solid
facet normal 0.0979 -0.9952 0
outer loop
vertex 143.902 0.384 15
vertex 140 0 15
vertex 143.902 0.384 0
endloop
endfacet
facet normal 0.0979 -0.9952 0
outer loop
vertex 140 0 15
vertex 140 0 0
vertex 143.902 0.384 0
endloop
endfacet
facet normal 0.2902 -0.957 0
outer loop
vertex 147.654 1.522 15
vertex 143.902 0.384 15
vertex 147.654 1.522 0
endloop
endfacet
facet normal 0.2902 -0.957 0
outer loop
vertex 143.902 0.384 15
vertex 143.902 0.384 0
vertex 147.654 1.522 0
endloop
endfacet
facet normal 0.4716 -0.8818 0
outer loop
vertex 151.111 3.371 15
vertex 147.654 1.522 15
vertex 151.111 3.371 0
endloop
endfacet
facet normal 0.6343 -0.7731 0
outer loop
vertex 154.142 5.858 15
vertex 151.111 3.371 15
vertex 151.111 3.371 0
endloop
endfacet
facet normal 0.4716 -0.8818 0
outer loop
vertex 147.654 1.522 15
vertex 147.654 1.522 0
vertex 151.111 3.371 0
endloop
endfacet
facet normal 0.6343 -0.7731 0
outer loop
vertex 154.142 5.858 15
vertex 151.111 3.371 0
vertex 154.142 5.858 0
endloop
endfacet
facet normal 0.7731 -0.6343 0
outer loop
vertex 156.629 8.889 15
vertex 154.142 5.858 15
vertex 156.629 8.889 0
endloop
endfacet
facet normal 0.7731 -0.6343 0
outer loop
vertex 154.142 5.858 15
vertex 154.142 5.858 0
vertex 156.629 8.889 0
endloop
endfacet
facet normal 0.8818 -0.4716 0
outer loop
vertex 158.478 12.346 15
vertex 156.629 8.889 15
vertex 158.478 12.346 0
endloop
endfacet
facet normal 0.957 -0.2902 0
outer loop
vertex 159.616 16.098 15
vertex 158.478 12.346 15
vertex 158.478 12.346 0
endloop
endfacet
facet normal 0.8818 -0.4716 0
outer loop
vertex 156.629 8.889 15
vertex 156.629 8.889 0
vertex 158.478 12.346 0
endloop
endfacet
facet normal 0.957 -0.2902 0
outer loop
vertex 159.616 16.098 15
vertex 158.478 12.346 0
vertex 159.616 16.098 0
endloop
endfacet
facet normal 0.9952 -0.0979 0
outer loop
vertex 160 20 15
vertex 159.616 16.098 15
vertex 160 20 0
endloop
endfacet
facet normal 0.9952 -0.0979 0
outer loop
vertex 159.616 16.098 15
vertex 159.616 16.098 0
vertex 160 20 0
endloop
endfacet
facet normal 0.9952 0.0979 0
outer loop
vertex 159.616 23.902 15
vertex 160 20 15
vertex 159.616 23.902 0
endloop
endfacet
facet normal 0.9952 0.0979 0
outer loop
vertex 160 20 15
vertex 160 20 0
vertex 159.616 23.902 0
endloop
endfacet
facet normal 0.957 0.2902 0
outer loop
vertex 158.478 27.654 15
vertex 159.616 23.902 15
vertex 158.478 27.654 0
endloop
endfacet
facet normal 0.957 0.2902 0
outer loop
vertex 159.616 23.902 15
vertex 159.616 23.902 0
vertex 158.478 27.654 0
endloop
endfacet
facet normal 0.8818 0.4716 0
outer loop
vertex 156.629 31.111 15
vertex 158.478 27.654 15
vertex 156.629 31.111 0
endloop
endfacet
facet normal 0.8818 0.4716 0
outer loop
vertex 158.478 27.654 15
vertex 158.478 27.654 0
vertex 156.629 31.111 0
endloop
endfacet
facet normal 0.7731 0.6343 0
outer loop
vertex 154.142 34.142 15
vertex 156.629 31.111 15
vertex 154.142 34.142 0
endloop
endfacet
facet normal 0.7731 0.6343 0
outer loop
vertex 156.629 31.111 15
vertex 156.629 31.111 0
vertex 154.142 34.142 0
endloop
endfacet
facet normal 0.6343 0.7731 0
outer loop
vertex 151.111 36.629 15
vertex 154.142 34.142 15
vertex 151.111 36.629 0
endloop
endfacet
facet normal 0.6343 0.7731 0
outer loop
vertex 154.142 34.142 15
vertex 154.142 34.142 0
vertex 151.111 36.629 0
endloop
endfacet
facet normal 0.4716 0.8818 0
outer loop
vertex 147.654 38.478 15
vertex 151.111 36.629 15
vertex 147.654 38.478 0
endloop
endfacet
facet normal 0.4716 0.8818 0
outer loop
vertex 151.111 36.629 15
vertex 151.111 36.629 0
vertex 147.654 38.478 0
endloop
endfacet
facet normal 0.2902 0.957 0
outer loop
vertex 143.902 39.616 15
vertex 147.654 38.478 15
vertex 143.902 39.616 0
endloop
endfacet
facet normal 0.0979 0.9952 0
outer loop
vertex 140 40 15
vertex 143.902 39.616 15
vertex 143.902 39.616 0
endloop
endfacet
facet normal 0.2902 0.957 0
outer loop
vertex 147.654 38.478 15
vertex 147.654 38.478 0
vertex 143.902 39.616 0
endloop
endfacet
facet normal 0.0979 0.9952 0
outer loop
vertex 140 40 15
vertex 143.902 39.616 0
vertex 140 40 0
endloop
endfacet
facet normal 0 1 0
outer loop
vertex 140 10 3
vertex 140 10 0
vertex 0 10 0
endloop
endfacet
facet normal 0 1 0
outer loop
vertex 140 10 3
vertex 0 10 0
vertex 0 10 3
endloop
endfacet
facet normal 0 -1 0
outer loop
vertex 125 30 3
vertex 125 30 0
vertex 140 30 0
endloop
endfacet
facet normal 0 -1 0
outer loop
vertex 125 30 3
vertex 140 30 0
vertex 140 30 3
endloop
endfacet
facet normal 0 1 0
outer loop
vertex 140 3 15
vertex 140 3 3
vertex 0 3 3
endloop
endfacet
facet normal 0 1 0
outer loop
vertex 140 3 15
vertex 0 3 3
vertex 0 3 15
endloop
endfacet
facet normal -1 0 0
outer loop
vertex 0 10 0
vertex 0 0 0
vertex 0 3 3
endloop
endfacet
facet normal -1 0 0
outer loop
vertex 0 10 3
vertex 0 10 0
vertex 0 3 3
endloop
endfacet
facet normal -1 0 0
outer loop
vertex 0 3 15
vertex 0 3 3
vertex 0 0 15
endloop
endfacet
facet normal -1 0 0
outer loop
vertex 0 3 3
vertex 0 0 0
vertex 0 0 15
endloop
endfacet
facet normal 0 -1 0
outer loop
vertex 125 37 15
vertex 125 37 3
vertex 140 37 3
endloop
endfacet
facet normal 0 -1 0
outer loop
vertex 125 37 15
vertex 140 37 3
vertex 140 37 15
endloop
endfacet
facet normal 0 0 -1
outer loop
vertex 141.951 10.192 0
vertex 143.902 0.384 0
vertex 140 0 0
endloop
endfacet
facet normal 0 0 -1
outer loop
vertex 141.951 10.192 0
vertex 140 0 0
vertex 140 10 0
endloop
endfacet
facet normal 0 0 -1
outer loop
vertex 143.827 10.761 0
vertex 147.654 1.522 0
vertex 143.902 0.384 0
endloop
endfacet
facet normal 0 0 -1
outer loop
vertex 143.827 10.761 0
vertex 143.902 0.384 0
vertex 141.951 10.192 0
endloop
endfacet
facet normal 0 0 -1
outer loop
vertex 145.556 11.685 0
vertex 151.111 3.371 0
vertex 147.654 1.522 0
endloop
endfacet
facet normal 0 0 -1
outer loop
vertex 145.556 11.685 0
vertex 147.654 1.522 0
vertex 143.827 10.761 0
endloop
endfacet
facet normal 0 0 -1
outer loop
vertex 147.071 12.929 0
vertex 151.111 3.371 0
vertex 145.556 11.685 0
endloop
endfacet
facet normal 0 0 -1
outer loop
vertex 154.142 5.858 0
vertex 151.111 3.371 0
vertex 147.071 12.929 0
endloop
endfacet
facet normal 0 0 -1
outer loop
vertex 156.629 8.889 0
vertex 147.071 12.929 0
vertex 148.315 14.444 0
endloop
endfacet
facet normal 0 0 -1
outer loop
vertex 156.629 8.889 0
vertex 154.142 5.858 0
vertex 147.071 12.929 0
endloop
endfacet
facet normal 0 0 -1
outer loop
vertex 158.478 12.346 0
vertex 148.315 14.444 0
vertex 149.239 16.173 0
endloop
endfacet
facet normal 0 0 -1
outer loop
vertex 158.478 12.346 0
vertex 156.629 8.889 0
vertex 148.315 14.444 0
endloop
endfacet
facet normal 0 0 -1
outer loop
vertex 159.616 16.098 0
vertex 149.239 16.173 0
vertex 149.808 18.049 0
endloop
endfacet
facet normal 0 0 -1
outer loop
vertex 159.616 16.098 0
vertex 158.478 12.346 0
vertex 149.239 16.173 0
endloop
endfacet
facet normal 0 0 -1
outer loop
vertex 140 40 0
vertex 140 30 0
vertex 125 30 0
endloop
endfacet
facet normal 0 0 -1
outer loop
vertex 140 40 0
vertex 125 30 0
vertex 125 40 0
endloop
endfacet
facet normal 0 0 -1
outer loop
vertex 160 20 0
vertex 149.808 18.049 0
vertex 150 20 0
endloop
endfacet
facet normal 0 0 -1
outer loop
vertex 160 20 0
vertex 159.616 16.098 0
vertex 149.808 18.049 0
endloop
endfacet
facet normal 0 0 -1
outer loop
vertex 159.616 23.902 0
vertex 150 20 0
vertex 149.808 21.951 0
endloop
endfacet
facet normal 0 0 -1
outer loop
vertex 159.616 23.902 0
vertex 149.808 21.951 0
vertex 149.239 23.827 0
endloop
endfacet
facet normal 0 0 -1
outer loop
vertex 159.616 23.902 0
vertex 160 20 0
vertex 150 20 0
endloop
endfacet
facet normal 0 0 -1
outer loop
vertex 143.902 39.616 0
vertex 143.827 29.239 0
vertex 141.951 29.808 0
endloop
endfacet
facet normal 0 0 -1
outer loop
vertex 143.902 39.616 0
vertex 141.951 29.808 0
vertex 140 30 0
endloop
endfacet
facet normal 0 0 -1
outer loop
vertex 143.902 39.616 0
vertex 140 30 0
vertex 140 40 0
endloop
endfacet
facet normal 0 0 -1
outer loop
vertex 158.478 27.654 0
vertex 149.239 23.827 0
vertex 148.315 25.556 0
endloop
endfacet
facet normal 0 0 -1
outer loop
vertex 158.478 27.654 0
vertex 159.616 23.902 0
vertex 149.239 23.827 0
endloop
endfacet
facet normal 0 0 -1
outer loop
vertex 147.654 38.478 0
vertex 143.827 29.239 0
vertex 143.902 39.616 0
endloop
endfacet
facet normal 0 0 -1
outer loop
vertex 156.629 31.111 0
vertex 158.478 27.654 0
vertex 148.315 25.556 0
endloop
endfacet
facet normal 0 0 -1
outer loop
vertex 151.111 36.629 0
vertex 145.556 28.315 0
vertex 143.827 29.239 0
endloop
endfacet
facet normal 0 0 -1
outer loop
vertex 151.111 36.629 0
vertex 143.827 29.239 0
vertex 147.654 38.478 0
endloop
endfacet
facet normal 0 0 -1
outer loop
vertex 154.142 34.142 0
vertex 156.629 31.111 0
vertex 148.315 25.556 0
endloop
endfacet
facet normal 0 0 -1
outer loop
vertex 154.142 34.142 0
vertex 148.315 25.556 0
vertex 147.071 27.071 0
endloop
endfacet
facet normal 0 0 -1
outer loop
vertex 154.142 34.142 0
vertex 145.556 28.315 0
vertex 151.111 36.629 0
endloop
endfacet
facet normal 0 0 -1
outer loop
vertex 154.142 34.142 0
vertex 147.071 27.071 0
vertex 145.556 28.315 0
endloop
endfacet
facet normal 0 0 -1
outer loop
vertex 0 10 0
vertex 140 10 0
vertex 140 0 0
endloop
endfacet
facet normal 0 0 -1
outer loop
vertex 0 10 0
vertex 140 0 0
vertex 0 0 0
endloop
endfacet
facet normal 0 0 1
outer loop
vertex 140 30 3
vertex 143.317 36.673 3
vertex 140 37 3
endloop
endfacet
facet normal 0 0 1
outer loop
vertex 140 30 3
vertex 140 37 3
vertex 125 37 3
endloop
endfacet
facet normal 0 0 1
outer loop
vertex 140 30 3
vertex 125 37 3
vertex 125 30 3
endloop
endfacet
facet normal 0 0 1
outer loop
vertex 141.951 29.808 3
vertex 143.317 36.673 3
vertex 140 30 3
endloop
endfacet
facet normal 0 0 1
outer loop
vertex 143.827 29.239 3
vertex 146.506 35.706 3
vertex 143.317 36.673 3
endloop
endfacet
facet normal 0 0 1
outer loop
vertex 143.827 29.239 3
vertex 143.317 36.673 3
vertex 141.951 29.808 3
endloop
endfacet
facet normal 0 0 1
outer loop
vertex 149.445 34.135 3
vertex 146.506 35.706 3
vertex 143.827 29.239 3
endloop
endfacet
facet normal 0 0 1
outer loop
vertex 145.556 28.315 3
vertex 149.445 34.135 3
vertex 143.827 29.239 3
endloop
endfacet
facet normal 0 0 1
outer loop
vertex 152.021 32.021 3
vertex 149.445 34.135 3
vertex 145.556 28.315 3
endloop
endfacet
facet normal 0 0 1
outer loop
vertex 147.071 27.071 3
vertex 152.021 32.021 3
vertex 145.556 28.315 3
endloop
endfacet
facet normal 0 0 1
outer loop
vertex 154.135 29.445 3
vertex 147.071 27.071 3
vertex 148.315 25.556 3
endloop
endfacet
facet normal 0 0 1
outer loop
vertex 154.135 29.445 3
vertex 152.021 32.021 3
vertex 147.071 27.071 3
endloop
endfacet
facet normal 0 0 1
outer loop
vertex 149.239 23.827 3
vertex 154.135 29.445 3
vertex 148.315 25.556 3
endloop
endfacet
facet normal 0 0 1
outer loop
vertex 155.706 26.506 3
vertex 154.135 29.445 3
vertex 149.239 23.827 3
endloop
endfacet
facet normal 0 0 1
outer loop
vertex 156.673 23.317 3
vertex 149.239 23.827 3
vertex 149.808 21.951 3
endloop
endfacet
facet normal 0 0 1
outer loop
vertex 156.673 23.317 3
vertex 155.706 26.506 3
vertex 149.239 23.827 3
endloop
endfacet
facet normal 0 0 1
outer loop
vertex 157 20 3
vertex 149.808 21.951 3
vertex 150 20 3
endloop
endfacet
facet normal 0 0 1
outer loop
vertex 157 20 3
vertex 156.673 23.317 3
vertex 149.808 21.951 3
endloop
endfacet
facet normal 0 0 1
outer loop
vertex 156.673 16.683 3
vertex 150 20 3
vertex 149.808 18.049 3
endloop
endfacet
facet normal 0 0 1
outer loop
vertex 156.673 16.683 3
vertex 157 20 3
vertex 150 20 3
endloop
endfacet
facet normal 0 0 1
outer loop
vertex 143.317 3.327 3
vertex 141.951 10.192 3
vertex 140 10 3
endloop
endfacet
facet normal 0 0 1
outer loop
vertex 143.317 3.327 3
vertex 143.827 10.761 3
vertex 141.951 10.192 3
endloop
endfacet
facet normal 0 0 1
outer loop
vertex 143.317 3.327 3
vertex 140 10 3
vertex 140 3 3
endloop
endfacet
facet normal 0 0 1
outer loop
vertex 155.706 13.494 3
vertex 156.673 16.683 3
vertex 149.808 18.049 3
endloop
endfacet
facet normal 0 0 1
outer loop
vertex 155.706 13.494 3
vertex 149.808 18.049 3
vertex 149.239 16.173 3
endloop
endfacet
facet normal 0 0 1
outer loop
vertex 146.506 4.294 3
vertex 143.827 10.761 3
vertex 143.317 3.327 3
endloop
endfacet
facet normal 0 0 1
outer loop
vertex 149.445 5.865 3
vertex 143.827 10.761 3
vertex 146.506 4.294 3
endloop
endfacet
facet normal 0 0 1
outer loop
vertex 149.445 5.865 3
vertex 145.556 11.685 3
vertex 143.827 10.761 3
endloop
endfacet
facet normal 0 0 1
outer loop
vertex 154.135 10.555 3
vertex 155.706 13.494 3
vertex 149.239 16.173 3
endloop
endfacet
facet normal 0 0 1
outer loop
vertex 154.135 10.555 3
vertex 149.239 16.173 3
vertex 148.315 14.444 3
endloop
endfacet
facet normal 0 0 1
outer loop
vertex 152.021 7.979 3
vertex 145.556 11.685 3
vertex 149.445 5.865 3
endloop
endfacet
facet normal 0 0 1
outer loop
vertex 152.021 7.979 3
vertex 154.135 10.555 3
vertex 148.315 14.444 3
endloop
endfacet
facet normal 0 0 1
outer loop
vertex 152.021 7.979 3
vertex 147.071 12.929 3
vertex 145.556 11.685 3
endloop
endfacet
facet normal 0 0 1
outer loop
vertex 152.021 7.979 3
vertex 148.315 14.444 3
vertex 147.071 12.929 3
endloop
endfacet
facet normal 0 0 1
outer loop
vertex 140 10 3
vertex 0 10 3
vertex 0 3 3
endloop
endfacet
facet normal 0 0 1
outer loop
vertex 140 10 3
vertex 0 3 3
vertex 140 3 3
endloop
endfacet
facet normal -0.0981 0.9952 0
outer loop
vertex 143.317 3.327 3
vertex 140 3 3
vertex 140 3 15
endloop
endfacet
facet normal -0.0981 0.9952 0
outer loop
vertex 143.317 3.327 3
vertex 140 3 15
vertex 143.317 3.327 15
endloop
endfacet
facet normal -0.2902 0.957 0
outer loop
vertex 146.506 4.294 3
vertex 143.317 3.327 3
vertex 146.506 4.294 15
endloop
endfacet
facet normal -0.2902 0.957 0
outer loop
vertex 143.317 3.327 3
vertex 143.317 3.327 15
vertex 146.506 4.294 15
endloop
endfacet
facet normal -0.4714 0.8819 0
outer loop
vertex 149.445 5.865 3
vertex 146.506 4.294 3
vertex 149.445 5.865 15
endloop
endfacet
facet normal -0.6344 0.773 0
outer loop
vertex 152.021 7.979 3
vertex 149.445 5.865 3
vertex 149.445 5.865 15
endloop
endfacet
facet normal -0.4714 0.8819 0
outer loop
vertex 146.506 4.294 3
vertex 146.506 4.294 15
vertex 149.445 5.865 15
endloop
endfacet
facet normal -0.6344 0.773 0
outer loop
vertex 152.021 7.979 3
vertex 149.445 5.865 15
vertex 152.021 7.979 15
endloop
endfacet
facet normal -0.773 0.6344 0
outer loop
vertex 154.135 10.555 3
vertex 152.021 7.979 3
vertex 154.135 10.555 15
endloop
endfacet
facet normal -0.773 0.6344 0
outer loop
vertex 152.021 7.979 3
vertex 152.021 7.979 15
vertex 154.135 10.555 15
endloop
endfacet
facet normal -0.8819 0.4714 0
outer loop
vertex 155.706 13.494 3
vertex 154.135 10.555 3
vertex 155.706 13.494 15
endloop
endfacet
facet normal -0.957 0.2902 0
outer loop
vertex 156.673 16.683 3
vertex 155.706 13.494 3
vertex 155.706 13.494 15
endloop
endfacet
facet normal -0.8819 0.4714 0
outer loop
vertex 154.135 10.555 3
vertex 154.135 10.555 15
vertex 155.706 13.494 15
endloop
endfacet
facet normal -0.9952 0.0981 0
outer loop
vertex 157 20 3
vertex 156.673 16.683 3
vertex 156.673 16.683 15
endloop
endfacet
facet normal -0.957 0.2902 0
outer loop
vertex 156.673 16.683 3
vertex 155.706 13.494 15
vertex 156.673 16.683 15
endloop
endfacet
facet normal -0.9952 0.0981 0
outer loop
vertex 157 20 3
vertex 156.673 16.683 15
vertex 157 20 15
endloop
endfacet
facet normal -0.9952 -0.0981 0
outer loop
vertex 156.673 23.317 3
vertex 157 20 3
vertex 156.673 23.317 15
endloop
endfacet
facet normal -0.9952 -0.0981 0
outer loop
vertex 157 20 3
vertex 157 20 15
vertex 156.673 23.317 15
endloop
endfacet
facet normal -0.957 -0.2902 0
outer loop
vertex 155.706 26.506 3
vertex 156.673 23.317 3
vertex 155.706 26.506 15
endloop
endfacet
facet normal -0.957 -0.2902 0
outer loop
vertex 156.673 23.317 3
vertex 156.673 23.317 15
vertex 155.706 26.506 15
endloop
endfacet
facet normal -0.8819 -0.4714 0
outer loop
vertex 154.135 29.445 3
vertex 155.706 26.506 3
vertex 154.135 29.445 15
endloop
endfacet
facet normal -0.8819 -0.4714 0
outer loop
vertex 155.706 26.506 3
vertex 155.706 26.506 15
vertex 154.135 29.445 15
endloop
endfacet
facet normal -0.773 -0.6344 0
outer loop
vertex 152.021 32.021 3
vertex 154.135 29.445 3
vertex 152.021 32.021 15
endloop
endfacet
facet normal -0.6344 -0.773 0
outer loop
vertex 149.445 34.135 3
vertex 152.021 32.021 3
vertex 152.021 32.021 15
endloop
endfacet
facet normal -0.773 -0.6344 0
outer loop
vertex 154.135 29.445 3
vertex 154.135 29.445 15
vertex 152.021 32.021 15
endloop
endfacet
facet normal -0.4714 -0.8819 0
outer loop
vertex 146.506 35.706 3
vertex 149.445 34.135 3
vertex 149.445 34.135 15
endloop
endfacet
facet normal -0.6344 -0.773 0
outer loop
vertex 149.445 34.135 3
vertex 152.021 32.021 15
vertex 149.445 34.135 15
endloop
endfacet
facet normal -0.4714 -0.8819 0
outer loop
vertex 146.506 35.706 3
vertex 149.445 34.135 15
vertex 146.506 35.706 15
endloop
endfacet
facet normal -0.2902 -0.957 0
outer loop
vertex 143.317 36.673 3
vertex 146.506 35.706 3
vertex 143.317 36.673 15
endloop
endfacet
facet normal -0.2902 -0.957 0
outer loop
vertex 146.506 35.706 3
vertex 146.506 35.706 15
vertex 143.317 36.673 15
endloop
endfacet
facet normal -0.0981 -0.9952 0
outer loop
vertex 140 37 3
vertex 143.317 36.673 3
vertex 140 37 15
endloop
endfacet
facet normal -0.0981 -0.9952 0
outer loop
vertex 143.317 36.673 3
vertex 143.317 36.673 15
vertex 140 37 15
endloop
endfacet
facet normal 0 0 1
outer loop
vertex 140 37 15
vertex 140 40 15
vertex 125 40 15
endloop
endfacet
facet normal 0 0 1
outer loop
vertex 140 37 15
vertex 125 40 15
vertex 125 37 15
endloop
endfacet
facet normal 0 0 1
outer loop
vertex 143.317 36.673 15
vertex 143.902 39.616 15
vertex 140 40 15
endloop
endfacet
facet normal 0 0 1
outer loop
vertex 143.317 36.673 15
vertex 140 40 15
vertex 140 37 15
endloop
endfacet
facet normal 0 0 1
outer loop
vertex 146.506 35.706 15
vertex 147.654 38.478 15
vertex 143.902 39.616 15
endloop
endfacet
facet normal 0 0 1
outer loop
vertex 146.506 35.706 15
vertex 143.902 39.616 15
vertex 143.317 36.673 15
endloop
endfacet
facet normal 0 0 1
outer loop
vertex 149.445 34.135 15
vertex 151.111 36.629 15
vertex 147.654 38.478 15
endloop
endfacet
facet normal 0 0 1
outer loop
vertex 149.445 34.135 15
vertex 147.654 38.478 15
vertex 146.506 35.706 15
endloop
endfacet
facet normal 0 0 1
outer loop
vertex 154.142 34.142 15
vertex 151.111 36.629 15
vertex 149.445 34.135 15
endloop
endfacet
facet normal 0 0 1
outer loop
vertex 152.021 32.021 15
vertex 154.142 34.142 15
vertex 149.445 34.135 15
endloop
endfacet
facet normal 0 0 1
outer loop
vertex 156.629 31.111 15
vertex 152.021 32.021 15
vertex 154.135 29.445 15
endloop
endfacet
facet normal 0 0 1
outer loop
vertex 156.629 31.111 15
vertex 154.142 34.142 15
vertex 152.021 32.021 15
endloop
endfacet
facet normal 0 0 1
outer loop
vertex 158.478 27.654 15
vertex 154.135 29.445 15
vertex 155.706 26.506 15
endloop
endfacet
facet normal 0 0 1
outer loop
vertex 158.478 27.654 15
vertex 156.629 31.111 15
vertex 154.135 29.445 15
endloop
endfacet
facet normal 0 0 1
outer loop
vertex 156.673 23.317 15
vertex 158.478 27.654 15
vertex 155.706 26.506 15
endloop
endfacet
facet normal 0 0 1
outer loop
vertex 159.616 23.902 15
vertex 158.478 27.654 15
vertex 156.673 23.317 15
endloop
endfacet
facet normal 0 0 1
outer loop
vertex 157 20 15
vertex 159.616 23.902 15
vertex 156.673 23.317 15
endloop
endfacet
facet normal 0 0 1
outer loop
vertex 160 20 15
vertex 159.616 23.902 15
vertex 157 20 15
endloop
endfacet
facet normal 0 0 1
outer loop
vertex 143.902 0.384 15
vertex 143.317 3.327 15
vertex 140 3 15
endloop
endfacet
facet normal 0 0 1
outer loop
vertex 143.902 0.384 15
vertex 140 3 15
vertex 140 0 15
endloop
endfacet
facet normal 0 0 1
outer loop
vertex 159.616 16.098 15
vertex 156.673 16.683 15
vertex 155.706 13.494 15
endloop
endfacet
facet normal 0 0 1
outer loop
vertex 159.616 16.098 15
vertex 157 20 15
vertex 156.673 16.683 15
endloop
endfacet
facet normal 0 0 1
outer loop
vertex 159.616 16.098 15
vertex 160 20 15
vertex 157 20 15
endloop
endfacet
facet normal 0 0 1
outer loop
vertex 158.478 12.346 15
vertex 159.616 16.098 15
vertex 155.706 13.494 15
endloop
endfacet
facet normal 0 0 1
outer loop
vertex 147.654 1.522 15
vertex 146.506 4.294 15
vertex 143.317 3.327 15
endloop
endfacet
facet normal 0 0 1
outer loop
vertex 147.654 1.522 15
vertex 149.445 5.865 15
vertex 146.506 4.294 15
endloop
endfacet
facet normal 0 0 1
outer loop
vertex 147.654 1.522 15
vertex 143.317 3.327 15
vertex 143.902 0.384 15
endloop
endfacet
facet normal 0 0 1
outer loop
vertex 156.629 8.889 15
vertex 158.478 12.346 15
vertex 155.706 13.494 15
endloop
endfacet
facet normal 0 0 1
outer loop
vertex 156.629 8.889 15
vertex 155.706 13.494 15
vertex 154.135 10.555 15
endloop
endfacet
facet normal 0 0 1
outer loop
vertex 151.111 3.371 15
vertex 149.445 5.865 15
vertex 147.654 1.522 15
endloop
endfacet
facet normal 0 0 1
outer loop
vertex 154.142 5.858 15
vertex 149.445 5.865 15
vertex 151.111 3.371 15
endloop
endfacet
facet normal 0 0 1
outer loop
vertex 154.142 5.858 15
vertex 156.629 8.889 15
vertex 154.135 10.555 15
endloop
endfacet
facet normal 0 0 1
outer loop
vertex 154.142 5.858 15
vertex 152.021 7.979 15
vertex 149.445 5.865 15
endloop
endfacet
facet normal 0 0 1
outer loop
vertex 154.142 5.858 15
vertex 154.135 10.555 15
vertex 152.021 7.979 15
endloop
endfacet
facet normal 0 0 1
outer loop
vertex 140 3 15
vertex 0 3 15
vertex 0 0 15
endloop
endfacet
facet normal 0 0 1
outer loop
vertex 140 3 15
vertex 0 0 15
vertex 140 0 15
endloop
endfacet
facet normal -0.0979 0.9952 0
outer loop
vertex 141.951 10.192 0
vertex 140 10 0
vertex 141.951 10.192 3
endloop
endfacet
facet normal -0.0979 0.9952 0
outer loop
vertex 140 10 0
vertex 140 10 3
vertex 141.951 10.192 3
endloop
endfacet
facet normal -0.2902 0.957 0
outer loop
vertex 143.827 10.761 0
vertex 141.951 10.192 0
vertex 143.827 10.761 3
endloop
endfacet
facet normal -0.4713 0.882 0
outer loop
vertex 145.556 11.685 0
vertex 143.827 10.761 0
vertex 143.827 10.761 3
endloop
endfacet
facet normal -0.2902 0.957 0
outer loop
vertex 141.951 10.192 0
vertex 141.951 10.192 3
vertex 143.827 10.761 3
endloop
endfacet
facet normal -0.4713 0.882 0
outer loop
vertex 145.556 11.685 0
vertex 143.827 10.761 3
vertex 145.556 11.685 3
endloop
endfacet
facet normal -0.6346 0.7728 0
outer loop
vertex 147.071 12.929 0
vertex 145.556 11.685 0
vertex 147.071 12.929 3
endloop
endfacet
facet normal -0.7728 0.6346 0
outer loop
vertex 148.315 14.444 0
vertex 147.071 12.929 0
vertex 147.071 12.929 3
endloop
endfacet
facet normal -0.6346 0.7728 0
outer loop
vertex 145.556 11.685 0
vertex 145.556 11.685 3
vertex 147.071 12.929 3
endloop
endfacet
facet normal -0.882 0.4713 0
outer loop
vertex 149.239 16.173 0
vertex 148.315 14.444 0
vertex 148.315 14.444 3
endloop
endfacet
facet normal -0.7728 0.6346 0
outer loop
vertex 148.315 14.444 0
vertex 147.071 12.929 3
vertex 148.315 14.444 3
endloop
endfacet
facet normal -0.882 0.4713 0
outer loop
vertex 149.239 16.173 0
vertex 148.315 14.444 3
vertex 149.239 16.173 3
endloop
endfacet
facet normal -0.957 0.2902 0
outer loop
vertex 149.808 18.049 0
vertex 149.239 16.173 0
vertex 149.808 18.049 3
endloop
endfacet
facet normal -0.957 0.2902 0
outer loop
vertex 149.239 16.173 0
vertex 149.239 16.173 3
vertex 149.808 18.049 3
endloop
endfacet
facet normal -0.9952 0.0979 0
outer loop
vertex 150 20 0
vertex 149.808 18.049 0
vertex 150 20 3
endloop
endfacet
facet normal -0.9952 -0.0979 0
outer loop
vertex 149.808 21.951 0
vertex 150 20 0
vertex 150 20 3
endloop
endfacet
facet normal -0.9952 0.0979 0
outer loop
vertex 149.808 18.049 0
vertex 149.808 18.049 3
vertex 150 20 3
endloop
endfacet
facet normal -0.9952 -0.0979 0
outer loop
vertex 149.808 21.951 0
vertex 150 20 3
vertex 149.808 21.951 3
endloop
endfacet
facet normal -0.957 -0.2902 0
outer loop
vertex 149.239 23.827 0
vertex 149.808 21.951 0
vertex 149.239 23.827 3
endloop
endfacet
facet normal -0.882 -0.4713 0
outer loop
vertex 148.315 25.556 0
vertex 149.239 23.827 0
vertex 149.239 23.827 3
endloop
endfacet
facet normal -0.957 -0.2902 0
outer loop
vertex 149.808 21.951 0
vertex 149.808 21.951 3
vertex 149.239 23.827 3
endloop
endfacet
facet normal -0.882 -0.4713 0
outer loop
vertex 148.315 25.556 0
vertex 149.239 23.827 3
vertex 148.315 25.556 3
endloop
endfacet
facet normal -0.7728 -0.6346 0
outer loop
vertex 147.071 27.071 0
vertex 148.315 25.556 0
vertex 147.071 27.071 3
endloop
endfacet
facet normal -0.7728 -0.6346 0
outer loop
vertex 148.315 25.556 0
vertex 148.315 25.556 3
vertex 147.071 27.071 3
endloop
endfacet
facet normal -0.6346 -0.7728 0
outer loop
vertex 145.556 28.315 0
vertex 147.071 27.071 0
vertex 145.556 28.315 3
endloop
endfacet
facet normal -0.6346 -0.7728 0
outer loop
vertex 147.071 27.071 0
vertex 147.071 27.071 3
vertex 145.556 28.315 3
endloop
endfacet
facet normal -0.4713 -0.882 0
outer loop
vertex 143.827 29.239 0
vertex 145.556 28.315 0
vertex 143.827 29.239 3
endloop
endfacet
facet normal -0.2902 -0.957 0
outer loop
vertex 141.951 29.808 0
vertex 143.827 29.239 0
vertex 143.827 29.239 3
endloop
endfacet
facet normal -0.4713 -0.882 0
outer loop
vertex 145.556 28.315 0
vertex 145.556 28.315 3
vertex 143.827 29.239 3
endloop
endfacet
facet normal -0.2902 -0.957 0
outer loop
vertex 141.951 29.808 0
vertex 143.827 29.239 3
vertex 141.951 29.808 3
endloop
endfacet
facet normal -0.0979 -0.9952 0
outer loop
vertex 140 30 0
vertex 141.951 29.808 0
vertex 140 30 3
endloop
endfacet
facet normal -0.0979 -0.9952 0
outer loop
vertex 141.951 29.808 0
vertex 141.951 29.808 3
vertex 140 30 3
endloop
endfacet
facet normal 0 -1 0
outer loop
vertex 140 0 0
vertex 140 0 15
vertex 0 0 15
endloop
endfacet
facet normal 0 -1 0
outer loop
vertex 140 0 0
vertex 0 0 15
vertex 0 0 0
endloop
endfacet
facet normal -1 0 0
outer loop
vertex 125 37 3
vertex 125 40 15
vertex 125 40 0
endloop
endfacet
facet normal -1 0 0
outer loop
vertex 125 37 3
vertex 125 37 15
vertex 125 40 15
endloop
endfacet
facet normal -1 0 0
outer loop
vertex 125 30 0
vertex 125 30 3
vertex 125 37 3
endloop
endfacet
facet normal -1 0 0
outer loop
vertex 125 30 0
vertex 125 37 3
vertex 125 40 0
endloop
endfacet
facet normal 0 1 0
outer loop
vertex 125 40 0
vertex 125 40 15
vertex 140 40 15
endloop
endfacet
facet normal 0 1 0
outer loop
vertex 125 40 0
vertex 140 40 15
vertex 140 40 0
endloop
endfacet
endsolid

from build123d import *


with BuildPart() as f2:
    # F2: sweep along a path in F0
    with BuildLine(Plane.XY) as f2_path:
        Line((0, 0), (140, 0))
        ThreePointArc((140, 0), (160, 20), (140, 40))
        Line((140, 40), (125, 40))
    # F1 (on Right) → F2 (sweep)
    with BuildSketch(Plane.YZ):
        Polygon((0, 15), (0, 0), (10, 0), (10, 3), (3, 3), (3, 15), align=None)
    sweep(path=f2_path.line)


solid = f2.part
